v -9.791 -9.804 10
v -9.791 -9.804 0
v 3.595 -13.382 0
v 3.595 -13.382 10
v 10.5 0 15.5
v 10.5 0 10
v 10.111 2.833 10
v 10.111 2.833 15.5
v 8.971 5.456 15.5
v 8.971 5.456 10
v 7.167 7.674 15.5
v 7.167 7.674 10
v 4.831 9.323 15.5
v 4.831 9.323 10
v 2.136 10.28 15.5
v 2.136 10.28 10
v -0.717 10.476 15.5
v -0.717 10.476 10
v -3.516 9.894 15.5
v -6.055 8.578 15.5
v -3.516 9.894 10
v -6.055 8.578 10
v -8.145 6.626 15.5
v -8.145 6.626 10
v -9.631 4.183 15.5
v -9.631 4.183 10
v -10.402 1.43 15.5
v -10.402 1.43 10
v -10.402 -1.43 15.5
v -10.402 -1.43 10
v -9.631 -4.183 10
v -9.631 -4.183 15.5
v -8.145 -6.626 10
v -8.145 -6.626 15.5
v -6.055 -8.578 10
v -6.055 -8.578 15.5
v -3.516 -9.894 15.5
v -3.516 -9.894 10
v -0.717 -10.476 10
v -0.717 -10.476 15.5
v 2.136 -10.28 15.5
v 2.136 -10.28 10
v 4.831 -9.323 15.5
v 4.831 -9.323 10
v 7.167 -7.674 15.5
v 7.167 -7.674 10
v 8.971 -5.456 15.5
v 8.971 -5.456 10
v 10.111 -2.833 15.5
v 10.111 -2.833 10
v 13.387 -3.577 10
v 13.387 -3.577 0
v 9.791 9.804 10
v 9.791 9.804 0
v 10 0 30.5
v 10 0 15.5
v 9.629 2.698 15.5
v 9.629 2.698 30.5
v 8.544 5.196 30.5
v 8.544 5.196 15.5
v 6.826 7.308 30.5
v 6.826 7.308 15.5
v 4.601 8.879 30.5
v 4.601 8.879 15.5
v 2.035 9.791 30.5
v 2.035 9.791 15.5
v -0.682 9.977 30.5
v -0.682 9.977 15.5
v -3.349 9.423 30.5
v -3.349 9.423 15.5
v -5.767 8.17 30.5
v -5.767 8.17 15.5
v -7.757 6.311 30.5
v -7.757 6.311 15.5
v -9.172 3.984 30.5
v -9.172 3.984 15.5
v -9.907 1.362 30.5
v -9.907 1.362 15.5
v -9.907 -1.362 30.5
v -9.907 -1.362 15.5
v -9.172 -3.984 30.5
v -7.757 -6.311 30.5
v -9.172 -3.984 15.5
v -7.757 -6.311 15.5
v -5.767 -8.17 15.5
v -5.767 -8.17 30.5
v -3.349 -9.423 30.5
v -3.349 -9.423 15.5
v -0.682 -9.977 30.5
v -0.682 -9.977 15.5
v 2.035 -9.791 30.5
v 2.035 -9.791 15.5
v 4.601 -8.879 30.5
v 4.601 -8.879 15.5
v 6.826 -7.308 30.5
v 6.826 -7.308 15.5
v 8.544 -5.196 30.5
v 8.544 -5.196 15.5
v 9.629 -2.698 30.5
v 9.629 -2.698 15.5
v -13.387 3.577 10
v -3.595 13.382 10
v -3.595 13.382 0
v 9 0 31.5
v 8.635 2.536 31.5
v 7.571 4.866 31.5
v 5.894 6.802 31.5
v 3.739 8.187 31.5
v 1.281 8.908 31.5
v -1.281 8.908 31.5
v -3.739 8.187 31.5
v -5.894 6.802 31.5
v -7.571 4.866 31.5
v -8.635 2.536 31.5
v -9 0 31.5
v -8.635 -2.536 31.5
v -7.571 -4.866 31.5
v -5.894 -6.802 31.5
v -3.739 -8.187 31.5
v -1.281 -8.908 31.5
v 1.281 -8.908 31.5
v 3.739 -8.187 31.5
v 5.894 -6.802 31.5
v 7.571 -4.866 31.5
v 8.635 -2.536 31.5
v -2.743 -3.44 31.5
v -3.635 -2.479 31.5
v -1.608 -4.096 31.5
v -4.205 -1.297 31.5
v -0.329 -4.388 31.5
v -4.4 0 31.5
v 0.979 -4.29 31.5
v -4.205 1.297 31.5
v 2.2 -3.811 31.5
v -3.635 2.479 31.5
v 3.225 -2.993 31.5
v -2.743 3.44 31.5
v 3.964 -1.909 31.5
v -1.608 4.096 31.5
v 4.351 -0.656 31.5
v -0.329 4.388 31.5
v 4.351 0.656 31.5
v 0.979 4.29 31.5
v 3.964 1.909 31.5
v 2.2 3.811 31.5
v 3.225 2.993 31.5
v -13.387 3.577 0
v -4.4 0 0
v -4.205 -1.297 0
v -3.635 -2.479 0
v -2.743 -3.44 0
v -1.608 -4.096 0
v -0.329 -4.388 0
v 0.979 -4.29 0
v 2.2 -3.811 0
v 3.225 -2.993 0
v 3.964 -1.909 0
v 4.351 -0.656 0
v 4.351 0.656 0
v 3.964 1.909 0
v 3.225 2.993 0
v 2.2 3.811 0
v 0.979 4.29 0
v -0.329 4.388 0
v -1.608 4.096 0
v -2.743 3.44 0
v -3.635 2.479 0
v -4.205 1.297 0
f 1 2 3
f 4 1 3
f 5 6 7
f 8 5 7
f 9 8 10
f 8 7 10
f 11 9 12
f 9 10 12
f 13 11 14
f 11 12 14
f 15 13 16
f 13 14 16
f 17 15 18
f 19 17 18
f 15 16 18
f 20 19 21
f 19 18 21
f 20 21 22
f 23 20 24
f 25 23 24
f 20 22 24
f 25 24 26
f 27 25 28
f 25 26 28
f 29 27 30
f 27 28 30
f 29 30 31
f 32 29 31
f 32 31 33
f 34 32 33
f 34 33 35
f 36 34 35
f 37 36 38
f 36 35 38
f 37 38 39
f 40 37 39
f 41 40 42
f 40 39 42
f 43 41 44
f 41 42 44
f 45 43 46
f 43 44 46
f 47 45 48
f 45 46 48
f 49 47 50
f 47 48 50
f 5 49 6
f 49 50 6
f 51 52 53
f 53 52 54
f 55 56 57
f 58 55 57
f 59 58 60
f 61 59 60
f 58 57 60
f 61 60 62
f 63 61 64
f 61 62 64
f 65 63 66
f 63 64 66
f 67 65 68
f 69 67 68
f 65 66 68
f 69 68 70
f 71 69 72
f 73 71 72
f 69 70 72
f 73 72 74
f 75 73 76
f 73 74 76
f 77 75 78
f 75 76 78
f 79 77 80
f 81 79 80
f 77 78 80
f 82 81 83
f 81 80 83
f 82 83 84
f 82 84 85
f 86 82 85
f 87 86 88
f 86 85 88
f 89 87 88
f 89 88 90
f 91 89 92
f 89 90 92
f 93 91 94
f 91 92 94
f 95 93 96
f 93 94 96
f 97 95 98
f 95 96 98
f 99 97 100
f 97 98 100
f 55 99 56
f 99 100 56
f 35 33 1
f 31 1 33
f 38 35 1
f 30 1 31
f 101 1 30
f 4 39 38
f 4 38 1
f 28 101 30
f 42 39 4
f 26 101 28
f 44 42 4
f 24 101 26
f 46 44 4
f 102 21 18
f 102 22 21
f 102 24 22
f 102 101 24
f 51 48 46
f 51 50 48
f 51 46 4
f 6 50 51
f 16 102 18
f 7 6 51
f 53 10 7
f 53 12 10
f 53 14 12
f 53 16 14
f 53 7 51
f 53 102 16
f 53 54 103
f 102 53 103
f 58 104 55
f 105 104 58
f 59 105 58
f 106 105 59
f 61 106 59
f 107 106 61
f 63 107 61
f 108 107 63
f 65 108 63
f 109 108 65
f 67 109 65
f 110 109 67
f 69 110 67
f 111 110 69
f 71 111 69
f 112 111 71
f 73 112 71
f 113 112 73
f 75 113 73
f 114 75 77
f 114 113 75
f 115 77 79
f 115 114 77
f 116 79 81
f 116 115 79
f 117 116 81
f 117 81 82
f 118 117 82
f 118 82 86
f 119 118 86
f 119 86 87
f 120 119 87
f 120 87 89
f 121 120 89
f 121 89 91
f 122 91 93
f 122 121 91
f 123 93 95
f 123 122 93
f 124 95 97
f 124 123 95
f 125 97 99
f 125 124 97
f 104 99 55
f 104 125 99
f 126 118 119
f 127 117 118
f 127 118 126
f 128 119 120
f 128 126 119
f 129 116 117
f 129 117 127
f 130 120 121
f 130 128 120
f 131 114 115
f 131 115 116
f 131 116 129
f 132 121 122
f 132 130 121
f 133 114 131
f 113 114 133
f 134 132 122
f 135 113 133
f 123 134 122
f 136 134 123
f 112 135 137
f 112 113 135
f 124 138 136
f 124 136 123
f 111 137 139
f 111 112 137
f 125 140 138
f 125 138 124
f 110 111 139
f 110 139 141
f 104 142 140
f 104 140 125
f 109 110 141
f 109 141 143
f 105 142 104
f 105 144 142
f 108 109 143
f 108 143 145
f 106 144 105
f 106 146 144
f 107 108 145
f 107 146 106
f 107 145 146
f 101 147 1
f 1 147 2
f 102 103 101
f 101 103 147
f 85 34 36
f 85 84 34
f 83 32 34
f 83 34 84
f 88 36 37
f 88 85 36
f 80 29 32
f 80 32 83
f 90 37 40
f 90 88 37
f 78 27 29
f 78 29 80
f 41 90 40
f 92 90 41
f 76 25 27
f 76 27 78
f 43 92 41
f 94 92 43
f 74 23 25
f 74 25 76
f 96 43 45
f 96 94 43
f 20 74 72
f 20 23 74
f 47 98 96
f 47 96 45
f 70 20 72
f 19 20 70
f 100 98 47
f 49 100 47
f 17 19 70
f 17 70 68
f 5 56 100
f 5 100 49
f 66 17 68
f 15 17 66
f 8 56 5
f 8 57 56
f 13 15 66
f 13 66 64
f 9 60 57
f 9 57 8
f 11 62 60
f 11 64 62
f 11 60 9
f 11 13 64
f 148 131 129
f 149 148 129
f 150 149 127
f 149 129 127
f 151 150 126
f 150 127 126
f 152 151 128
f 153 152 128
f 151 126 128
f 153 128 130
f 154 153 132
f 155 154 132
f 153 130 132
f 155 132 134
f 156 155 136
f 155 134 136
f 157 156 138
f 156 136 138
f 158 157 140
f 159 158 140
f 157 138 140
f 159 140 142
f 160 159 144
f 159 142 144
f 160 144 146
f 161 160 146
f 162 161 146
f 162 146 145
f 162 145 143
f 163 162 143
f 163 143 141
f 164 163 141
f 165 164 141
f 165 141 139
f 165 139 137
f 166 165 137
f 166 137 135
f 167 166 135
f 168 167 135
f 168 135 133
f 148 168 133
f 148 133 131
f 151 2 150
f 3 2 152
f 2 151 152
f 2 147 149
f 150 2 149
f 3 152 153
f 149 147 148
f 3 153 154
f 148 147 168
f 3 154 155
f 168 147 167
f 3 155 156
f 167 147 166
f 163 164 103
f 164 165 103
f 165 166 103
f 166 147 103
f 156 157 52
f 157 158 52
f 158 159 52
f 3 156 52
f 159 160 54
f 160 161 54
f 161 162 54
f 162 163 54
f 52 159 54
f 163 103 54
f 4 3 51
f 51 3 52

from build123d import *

# Parameters (mm, degrees)
F1_DEPTH = 10
F2_R     = 10.5
F3_DEPTH = 5.5
F4_R     = 10
F5_DEPTH = 16
F6_SIZE  = 1
F8_D     = 8.8


with BuildPart() as f1:
    # F0 (on Top) → F1 (new body)
    with BuildSketch(Plane.XY):
        Polygon((3.5951366344, -13.3818904711), (13.3866254158, -3.5774655801), (9.7914887815, 9.804424891), (-3.5951366344, 13.3818904711), (-13.3866254158, 3.5774655801), (-9.7914887815, -9.804424891), align=None)
    extrude(amount=F1_DEPTH)

    # F2 (on face) → F3 (join)
    with BuildSketch(Plane.XY.offset(10)):
        Circle(F2_R)
    extrude(amount=F3_DEPTH)

    # F4 (on face) → F5 (join)
    with BuildSketch(Plane.XY.offset(15.5)):
        Circle(F4_R)
    extrude(amount=F5_DEPTH)

    # F6
    f6_edges = [f1.edges().sort_by_distance(p)[0] for p in [
        (-10, 0, 31.5),
    ]]
    chamfer(f6_edges, length=F6_SIZE)

    # F8 (through all)
    with Locations(Plane(origin=(0, 0, 0), x_dir=(1, 0, 0), z_dir=(0, 0, -1))):
        with Locations((0, 0)):
            Hole(F8_D / 2)


solid = f1.part
